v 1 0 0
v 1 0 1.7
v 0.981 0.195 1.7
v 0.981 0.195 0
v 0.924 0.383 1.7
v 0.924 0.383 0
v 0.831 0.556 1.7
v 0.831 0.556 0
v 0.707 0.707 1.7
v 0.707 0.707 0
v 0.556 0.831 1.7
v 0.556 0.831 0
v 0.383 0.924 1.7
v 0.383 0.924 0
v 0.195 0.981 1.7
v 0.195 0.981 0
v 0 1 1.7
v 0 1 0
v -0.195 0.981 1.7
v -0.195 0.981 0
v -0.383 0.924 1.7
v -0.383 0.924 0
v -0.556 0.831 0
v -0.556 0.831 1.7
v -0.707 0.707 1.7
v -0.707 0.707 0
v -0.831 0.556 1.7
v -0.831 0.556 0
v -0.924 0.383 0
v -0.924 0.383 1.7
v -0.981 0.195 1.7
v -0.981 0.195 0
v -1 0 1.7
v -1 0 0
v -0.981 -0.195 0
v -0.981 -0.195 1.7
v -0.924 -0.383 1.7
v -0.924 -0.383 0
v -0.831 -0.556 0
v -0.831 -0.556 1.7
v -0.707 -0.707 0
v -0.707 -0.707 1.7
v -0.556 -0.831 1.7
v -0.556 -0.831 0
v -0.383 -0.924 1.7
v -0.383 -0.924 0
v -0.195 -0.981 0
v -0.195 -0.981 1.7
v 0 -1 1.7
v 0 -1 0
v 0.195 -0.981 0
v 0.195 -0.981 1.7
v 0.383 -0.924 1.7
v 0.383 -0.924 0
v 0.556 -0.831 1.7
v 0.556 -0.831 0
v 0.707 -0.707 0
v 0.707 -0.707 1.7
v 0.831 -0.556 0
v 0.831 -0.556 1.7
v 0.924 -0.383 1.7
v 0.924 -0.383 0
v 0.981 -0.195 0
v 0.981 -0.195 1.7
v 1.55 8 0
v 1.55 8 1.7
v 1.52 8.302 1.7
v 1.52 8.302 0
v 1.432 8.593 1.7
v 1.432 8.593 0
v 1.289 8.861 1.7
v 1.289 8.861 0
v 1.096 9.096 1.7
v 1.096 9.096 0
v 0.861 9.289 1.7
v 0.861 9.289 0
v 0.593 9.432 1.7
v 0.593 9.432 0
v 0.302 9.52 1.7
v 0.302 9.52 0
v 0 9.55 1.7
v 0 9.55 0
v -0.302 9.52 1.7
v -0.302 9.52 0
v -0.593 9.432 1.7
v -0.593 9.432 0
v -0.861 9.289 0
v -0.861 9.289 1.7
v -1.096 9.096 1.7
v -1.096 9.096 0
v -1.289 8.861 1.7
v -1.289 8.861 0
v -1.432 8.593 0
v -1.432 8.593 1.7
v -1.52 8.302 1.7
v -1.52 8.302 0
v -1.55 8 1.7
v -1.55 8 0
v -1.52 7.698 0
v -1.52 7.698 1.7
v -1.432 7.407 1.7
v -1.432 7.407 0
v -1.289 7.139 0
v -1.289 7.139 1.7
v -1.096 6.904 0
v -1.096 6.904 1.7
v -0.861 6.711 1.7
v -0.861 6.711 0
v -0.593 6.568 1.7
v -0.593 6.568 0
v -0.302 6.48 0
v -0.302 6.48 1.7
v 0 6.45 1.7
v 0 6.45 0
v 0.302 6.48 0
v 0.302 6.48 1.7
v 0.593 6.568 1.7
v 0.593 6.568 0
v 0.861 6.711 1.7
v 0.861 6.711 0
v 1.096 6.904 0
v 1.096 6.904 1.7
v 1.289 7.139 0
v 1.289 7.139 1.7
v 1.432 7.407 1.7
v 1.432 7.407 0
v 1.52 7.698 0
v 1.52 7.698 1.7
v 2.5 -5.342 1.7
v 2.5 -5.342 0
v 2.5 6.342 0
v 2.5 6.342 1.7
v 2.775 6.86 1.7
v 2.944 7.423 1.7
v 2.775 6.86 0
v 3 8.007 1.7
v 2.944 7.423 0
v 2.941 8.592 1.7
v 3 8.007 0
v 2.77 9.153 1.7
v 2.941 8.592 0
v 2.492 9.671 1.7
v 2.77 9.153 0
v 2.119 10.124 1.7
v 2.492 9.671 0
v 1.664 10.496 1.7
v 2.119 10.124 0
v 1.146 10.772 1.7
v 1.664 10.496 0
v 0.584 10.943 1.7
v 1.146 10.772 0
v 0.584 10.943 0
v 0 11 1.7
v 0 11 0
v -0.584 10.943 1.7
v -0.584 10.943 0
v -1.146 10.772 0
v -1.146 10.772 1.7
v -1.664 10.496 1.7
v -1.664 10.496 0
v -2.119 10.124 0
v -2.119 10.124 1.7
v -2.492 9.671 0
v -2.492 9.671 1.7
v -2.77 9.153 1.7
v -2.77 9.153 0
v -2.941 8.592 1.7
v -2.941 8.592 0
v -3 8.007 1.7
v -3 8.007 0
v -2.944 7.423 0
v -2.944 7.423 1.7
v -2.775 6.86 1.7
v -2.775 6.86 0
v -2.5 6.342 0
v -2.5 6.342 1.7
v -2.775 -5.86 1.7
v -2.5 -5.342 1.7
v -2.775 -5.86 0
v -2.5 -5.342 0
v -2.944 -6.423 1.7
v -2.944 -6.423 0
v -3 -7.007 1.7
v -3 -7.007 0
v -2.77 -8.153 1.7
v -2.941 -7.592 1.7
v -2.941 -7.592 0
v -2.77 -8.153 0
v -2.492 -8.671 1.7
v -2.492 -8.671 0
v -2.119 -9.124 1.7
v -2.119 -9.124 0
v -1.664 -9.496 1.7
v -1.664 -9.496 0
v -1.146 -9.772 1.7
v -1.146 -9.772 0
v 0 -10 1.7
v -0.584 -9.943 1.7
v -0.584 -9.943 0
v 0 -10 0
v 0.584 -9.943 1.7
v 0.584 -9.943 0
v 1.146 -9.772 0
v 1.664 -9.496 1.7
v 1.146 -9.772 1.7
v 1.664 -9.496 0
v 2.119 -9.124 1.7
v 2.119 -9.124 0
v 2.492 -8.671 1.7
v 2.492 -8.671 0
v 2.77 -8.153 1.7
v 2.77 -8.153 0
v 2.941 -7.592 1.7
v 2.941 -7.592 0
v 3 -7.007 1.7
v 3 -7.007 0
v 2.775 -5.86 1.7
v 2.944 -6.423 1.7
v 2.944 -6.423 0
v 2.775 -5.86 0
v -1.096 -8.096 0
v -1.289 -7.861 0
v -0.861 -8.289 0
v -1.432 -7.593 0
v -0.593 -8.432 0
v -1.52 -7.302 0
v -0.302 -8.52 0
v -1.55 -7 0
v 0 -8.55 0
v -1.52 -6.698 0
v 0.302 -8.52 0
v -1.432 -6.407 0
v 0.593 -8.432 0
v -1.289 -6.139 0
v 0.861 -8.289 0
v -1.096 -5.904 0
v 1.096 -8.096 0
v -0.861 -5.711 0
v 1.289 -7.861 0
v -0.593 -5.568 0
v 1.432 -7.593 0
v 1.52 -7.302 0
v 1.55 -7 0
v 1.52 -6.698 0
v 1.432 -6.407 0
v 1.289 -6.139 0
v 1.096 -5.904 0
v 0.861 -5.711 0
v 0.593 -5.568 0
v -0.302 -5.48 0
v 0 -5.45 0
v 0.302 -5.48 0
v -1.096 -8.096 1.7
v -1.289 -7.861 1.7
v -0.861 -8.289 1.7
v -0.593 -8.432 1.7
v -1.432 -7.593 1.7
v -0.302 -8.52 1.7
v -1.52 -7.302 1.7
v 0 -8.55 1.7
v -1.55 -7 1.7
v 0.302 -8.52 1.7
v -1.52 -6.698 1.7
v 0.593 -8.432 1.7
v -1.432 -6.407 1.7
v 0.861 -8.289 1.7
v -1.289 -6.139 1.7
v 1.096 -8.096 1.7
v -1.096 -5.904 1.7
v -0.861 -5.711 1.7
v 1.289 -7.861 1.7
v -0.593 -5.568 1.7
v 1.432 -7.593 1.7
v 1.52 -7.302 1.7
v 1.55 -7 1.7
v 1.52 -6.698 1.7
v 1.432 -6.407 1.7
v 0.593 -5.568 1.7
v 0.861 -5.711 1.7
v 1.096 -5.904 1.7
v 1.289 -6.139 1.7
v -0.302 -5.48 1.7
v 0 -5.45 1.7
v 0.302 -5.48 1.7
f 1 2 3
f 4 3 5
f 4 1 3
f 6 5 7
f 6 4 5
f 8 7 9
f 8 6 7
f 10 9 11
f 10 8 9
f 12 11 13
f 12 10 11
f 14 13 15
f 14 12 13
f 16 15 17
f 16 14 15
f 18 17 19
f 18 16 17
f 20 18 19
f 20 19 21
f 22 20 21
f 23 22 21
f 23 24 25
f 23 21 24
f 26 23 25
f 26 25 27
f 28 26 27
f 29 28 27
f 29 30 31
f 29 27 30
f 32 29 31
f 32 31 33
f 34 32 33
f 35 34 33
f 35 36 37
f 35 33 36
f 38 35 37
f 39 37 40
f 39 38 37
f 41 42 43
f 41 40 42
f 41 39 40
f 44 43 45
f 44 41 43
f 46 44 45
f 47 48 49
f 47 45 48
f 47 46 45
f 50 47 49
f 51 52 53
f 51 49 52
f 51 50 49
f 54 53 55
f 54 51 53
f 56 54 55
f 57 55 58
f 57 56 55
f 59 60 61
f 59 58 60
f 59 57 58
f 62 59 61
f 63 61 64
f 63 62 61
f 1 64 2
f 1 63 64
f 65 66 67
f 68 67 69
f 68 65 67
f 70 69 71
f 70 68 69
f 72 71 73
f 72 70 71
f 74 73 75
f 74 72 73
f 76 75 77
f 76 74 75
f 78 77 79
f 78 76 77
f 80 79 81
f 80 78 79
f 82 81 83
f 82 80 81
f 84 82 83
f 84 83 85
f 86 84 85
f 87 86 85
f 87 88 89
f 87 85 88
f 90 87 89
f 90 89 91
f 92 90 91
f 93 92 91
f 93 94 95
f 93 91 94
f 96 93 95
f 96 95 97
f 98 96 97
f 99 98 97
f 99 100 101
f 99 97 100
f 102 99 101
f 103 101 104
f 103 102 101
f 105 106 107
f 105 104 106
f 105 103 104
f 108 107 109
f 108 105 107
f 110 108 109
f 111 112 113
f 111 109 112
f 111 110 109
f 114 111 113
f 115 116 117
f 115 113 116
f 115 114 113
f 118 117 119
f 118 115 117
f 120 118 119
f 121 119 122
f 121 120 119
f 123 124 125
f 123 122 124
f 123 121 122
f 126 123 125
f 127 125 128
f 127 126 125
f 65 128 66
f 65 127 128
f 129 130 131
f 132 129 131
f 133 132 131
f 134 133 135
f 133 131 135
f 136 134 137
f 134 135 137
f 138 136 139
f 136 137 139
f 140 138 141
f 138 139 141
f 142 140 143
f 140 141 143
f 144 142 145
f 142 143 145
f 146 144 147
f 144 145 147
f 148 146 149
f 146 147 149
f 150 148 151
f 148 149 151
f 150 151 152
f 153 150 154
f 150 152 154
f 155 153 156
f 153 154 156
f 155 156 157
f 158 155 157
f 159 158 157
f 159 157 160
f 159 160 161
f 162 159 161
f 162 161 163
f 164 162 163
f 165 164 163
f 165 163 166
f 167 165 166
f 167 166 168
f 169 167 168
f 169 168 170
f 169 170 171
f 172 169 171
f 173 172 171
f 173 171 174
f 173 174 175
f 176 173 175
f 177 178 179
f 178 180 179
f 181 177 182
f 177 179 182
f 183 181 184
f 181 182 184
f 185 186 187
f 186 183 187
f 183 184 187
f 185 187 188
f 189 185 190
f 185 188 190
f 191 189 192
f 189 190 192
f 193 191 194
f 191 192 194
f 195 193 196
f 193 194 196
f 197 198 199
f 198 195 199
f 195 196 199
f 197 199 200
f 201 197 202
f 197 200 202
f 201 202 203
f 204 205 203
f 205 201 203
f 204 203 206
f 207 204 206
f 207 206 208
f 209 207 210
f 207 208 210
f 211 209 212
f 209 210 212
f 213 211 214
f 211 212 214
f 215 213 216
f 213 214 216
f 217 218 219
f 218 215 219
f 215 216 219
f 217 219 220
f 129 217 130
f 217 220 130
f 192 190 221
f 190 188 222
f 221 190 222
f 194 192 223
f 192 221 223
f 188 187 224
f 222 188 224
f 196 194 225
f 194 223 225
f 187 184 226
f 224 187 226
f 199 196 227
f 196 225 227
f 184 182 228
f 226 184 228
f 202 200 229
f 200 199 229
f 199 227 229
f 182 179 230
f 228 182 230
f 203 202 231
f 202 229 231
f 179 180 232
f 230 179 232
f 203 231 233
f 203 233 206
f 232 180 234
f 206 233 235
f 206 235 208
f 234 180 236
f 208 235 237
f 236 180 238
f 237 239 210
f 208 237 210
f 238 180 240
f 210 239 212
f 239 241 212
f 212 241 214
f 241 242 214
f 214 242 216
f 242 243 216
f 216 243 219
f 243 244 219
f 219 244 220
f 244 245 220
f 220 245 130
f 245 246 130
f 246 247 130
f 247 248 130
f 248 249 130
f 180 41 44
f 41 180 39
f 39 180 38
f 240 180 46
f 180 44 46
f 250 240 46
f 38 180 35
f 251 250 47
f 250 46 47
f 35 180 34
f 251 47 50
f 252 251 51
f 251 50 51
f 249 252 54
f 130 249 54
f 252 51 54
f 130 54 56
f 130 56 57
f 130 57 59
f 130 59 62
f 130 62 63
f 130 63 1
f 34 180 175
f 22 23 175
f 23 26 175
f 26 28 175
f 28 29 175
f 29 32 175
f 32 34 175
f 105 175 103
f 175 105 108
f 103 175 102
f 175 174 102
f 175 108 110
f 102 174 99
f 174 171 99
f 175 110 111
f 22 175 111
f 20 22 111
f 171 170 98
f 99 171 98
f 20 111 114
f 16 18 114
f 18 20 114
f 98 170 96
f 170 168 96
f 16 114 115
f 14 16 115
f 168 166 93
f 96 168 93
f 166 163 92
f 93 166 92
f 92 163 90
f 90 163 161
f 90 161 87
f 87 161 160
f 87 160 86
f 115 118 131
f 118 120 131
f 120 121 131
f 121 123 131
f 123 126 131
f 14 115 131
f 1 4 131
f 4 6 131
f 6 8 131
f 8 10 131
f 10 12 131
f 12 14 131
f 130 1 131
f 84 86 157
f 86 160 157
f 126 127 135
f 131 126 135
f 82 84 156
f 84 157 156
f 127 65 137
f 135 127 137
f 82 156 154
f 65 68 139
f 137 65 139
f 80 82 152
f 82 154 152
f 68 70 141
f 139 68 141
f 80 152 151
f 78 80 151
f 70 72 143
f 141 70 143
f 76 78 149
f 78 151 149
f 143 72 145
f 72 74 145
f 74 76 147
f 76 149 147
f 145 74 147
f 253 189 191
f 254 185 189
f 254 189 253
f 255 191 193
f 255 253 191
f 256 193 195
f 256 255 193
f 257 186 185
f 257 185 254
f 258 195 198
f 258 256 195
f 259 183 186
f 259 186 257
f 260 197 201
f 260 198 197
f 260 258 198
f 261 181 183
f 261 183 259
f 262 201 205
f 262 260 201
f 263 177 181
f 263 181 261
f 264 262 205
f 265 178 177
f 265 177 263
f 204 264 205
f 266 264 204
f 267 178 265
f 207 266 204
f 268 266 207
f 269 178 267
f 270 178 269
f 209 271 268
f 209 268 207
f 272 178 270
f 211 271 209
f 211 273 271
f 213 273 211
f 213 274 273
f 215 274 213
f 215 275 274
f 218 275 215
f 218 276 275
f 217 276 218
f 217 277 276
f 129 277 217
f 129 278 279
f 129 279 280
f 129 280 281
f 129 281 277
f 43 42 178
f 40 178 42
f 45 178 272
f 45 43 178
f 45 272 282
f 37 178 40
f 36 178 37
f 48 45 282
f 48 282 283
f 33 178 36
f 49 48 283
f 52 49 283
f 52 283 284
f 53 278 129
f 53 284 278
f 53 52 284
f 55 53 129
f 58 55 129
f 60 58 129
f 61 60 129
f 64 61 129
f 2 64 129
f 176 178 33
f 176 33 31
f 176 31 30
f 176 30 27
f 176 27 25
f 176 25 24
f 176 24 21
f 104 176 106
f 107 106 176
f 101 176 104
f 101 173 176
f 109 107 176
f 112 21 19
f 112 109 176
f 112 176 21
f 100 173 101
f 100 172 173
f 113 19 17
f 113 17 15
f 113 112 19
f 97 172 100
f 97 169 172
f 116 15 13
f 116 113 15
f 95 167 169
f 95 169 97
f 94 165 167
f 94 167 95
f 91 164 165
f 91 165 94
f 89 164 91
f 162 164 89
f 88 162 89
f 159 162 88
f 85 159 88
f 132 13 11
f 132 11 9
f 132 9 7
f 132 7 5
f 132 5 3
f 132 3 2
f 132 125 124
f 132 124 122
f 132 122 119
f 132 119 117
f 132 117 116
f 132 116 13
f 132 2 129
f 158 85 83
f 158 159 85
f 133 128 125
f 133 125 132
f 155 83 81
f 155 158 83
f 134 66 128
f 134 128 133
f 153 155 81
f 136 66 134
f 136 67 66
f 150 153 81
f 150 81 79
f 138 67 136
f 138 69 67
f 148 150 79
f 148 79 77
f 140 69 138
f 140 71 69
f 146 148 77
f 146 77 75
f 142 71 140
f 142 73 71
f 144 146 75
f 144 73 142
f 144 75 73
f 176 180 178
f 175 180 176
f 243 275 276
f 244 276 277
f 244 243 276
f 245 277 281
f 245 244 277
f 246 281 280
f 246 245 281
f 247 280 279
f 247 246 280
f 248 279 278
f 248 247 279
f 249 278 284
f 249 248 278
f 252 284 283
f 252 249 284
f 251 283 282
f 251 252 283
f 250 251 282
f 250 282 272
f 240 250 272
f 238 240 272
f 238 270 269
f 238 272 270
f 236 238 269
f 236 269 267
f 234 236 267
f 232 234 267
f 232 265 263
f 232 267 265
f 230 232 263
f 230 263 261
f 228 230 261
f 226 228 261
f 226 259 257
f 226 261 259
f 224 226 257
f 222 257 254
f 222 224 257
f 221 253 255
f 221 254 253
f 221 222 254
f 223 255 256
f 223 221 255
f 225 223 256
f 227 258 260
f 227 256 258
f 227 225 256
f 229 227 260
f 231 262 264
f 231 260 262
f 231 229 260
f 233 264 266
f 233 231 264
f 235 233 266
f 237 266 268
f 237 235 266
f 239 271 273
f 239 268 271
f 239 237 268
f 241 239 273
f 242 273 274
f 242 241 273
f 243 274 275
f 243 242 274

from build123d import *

# Parameters (mm, degrees)
CYLINDER010_R     = 1.55
CYLINDER010_DEPTH = 10
CYLINDER_R        = 1
CYLINDER_DEPTH    = 10
CYLINDER009_R     = 1.55
CYLINDER009_DEPTH = 10
CYLINDER011_R     = 3
CYLINDER011_DEPTH = 1.7
BOX_W             = 5
BOX_H             = 19
BOX_DEPTH         = 1.7
FILLET_R          = 1
CYLINDER012_R     = 3
CYLINDER012_DEPTH = 1.7


with BuildPart() as threadedhole006:
    # Cylinder010 → Cylinder010 (new body)
    with BuildSketch(Plane(origin=(0, 8, 0), x_dir=(1, 0, 0), z_dir=(0, 0, 1))):
        Circle(CYLINDER010_R)
    extrude(amount=CYLINDER010_DEPTH)


with BuildPart() as cylinder:
    # Cylinder → Cylinder (new body)
    with BuildSketch(Plane.XY):
        Circle(CYLINDER_R)
    extrude(amount=CYLINDER_DEPTH)


with BuildPart() as fusion005:
    # Cylinder009 → Cylinder009 (new body)
    with BuildSketch(Plane(origin=(0, -7, 0), x_dir=(1, 0, 0), z_dir=(0, 0, 1))):
        Circle(CYLINDER009_R)
    extrude(amount=CYLINDER009_DEPTH)

    # Fusion005: union ThreadedHole006, Cylinder
    add(threadedhole006.part)
    add(cylinder.part)


with BuildPart() as threadedhole007:
    # Cylinder011 → Cylinder011 (new body)
    with BuildSketch(Plane(origin=(0, 8, 0), x_dir=(1, 0, 0), z_dir=(0, 0, 1))):
        Circle(CYLINDER011_R)
    extrude(amount=CYLINDER011_DEPTH)


with BuildPart() as fillet_body:
    # Box → Box (new body)
    with BuildSketch(Plane(origin=(-2.5, -9, 0), x_dir=(1, 0, 0), z_dir=(0, 0, 1))):
        with Locations((2.5, 9.5)):
            Rectangle(BOX_W, BOX_H)
    extrude(amount=BOX_DEPTH)

    # Fillet
    fillet_edges = [fillet_body.edges().sort_by_distance(p)[0] for p in [
        (-2.5, -9, 0.85),
        (-2.5, 10, 0.85),
        (2.5, -9, 0.85),
        (2.5, 10, 0.85),
    ]]
    fillet(fillet_edges, radius=FILLET_R)


with BuildPart() as cut:
    # Cylinder012 → Cylinder012 (new body)
    with BuildSketch(Plane(origin=(0, -7, 0), x_dir=(1, 0, 0), z_dir=(0, 0, 1))):
        Circle(CYLINDER012_R)
    extrude(amount=CYLINDER012_DEPTH)

    # Fusion: union ThreadedHole007, Fillet body
    add(threadedhole007.part)
    add(fillet_body.part)

    # Cut: cut Fusion005
    add(fusion005.part, mode=Mode.SUBTRACT)


solid = cut.part
